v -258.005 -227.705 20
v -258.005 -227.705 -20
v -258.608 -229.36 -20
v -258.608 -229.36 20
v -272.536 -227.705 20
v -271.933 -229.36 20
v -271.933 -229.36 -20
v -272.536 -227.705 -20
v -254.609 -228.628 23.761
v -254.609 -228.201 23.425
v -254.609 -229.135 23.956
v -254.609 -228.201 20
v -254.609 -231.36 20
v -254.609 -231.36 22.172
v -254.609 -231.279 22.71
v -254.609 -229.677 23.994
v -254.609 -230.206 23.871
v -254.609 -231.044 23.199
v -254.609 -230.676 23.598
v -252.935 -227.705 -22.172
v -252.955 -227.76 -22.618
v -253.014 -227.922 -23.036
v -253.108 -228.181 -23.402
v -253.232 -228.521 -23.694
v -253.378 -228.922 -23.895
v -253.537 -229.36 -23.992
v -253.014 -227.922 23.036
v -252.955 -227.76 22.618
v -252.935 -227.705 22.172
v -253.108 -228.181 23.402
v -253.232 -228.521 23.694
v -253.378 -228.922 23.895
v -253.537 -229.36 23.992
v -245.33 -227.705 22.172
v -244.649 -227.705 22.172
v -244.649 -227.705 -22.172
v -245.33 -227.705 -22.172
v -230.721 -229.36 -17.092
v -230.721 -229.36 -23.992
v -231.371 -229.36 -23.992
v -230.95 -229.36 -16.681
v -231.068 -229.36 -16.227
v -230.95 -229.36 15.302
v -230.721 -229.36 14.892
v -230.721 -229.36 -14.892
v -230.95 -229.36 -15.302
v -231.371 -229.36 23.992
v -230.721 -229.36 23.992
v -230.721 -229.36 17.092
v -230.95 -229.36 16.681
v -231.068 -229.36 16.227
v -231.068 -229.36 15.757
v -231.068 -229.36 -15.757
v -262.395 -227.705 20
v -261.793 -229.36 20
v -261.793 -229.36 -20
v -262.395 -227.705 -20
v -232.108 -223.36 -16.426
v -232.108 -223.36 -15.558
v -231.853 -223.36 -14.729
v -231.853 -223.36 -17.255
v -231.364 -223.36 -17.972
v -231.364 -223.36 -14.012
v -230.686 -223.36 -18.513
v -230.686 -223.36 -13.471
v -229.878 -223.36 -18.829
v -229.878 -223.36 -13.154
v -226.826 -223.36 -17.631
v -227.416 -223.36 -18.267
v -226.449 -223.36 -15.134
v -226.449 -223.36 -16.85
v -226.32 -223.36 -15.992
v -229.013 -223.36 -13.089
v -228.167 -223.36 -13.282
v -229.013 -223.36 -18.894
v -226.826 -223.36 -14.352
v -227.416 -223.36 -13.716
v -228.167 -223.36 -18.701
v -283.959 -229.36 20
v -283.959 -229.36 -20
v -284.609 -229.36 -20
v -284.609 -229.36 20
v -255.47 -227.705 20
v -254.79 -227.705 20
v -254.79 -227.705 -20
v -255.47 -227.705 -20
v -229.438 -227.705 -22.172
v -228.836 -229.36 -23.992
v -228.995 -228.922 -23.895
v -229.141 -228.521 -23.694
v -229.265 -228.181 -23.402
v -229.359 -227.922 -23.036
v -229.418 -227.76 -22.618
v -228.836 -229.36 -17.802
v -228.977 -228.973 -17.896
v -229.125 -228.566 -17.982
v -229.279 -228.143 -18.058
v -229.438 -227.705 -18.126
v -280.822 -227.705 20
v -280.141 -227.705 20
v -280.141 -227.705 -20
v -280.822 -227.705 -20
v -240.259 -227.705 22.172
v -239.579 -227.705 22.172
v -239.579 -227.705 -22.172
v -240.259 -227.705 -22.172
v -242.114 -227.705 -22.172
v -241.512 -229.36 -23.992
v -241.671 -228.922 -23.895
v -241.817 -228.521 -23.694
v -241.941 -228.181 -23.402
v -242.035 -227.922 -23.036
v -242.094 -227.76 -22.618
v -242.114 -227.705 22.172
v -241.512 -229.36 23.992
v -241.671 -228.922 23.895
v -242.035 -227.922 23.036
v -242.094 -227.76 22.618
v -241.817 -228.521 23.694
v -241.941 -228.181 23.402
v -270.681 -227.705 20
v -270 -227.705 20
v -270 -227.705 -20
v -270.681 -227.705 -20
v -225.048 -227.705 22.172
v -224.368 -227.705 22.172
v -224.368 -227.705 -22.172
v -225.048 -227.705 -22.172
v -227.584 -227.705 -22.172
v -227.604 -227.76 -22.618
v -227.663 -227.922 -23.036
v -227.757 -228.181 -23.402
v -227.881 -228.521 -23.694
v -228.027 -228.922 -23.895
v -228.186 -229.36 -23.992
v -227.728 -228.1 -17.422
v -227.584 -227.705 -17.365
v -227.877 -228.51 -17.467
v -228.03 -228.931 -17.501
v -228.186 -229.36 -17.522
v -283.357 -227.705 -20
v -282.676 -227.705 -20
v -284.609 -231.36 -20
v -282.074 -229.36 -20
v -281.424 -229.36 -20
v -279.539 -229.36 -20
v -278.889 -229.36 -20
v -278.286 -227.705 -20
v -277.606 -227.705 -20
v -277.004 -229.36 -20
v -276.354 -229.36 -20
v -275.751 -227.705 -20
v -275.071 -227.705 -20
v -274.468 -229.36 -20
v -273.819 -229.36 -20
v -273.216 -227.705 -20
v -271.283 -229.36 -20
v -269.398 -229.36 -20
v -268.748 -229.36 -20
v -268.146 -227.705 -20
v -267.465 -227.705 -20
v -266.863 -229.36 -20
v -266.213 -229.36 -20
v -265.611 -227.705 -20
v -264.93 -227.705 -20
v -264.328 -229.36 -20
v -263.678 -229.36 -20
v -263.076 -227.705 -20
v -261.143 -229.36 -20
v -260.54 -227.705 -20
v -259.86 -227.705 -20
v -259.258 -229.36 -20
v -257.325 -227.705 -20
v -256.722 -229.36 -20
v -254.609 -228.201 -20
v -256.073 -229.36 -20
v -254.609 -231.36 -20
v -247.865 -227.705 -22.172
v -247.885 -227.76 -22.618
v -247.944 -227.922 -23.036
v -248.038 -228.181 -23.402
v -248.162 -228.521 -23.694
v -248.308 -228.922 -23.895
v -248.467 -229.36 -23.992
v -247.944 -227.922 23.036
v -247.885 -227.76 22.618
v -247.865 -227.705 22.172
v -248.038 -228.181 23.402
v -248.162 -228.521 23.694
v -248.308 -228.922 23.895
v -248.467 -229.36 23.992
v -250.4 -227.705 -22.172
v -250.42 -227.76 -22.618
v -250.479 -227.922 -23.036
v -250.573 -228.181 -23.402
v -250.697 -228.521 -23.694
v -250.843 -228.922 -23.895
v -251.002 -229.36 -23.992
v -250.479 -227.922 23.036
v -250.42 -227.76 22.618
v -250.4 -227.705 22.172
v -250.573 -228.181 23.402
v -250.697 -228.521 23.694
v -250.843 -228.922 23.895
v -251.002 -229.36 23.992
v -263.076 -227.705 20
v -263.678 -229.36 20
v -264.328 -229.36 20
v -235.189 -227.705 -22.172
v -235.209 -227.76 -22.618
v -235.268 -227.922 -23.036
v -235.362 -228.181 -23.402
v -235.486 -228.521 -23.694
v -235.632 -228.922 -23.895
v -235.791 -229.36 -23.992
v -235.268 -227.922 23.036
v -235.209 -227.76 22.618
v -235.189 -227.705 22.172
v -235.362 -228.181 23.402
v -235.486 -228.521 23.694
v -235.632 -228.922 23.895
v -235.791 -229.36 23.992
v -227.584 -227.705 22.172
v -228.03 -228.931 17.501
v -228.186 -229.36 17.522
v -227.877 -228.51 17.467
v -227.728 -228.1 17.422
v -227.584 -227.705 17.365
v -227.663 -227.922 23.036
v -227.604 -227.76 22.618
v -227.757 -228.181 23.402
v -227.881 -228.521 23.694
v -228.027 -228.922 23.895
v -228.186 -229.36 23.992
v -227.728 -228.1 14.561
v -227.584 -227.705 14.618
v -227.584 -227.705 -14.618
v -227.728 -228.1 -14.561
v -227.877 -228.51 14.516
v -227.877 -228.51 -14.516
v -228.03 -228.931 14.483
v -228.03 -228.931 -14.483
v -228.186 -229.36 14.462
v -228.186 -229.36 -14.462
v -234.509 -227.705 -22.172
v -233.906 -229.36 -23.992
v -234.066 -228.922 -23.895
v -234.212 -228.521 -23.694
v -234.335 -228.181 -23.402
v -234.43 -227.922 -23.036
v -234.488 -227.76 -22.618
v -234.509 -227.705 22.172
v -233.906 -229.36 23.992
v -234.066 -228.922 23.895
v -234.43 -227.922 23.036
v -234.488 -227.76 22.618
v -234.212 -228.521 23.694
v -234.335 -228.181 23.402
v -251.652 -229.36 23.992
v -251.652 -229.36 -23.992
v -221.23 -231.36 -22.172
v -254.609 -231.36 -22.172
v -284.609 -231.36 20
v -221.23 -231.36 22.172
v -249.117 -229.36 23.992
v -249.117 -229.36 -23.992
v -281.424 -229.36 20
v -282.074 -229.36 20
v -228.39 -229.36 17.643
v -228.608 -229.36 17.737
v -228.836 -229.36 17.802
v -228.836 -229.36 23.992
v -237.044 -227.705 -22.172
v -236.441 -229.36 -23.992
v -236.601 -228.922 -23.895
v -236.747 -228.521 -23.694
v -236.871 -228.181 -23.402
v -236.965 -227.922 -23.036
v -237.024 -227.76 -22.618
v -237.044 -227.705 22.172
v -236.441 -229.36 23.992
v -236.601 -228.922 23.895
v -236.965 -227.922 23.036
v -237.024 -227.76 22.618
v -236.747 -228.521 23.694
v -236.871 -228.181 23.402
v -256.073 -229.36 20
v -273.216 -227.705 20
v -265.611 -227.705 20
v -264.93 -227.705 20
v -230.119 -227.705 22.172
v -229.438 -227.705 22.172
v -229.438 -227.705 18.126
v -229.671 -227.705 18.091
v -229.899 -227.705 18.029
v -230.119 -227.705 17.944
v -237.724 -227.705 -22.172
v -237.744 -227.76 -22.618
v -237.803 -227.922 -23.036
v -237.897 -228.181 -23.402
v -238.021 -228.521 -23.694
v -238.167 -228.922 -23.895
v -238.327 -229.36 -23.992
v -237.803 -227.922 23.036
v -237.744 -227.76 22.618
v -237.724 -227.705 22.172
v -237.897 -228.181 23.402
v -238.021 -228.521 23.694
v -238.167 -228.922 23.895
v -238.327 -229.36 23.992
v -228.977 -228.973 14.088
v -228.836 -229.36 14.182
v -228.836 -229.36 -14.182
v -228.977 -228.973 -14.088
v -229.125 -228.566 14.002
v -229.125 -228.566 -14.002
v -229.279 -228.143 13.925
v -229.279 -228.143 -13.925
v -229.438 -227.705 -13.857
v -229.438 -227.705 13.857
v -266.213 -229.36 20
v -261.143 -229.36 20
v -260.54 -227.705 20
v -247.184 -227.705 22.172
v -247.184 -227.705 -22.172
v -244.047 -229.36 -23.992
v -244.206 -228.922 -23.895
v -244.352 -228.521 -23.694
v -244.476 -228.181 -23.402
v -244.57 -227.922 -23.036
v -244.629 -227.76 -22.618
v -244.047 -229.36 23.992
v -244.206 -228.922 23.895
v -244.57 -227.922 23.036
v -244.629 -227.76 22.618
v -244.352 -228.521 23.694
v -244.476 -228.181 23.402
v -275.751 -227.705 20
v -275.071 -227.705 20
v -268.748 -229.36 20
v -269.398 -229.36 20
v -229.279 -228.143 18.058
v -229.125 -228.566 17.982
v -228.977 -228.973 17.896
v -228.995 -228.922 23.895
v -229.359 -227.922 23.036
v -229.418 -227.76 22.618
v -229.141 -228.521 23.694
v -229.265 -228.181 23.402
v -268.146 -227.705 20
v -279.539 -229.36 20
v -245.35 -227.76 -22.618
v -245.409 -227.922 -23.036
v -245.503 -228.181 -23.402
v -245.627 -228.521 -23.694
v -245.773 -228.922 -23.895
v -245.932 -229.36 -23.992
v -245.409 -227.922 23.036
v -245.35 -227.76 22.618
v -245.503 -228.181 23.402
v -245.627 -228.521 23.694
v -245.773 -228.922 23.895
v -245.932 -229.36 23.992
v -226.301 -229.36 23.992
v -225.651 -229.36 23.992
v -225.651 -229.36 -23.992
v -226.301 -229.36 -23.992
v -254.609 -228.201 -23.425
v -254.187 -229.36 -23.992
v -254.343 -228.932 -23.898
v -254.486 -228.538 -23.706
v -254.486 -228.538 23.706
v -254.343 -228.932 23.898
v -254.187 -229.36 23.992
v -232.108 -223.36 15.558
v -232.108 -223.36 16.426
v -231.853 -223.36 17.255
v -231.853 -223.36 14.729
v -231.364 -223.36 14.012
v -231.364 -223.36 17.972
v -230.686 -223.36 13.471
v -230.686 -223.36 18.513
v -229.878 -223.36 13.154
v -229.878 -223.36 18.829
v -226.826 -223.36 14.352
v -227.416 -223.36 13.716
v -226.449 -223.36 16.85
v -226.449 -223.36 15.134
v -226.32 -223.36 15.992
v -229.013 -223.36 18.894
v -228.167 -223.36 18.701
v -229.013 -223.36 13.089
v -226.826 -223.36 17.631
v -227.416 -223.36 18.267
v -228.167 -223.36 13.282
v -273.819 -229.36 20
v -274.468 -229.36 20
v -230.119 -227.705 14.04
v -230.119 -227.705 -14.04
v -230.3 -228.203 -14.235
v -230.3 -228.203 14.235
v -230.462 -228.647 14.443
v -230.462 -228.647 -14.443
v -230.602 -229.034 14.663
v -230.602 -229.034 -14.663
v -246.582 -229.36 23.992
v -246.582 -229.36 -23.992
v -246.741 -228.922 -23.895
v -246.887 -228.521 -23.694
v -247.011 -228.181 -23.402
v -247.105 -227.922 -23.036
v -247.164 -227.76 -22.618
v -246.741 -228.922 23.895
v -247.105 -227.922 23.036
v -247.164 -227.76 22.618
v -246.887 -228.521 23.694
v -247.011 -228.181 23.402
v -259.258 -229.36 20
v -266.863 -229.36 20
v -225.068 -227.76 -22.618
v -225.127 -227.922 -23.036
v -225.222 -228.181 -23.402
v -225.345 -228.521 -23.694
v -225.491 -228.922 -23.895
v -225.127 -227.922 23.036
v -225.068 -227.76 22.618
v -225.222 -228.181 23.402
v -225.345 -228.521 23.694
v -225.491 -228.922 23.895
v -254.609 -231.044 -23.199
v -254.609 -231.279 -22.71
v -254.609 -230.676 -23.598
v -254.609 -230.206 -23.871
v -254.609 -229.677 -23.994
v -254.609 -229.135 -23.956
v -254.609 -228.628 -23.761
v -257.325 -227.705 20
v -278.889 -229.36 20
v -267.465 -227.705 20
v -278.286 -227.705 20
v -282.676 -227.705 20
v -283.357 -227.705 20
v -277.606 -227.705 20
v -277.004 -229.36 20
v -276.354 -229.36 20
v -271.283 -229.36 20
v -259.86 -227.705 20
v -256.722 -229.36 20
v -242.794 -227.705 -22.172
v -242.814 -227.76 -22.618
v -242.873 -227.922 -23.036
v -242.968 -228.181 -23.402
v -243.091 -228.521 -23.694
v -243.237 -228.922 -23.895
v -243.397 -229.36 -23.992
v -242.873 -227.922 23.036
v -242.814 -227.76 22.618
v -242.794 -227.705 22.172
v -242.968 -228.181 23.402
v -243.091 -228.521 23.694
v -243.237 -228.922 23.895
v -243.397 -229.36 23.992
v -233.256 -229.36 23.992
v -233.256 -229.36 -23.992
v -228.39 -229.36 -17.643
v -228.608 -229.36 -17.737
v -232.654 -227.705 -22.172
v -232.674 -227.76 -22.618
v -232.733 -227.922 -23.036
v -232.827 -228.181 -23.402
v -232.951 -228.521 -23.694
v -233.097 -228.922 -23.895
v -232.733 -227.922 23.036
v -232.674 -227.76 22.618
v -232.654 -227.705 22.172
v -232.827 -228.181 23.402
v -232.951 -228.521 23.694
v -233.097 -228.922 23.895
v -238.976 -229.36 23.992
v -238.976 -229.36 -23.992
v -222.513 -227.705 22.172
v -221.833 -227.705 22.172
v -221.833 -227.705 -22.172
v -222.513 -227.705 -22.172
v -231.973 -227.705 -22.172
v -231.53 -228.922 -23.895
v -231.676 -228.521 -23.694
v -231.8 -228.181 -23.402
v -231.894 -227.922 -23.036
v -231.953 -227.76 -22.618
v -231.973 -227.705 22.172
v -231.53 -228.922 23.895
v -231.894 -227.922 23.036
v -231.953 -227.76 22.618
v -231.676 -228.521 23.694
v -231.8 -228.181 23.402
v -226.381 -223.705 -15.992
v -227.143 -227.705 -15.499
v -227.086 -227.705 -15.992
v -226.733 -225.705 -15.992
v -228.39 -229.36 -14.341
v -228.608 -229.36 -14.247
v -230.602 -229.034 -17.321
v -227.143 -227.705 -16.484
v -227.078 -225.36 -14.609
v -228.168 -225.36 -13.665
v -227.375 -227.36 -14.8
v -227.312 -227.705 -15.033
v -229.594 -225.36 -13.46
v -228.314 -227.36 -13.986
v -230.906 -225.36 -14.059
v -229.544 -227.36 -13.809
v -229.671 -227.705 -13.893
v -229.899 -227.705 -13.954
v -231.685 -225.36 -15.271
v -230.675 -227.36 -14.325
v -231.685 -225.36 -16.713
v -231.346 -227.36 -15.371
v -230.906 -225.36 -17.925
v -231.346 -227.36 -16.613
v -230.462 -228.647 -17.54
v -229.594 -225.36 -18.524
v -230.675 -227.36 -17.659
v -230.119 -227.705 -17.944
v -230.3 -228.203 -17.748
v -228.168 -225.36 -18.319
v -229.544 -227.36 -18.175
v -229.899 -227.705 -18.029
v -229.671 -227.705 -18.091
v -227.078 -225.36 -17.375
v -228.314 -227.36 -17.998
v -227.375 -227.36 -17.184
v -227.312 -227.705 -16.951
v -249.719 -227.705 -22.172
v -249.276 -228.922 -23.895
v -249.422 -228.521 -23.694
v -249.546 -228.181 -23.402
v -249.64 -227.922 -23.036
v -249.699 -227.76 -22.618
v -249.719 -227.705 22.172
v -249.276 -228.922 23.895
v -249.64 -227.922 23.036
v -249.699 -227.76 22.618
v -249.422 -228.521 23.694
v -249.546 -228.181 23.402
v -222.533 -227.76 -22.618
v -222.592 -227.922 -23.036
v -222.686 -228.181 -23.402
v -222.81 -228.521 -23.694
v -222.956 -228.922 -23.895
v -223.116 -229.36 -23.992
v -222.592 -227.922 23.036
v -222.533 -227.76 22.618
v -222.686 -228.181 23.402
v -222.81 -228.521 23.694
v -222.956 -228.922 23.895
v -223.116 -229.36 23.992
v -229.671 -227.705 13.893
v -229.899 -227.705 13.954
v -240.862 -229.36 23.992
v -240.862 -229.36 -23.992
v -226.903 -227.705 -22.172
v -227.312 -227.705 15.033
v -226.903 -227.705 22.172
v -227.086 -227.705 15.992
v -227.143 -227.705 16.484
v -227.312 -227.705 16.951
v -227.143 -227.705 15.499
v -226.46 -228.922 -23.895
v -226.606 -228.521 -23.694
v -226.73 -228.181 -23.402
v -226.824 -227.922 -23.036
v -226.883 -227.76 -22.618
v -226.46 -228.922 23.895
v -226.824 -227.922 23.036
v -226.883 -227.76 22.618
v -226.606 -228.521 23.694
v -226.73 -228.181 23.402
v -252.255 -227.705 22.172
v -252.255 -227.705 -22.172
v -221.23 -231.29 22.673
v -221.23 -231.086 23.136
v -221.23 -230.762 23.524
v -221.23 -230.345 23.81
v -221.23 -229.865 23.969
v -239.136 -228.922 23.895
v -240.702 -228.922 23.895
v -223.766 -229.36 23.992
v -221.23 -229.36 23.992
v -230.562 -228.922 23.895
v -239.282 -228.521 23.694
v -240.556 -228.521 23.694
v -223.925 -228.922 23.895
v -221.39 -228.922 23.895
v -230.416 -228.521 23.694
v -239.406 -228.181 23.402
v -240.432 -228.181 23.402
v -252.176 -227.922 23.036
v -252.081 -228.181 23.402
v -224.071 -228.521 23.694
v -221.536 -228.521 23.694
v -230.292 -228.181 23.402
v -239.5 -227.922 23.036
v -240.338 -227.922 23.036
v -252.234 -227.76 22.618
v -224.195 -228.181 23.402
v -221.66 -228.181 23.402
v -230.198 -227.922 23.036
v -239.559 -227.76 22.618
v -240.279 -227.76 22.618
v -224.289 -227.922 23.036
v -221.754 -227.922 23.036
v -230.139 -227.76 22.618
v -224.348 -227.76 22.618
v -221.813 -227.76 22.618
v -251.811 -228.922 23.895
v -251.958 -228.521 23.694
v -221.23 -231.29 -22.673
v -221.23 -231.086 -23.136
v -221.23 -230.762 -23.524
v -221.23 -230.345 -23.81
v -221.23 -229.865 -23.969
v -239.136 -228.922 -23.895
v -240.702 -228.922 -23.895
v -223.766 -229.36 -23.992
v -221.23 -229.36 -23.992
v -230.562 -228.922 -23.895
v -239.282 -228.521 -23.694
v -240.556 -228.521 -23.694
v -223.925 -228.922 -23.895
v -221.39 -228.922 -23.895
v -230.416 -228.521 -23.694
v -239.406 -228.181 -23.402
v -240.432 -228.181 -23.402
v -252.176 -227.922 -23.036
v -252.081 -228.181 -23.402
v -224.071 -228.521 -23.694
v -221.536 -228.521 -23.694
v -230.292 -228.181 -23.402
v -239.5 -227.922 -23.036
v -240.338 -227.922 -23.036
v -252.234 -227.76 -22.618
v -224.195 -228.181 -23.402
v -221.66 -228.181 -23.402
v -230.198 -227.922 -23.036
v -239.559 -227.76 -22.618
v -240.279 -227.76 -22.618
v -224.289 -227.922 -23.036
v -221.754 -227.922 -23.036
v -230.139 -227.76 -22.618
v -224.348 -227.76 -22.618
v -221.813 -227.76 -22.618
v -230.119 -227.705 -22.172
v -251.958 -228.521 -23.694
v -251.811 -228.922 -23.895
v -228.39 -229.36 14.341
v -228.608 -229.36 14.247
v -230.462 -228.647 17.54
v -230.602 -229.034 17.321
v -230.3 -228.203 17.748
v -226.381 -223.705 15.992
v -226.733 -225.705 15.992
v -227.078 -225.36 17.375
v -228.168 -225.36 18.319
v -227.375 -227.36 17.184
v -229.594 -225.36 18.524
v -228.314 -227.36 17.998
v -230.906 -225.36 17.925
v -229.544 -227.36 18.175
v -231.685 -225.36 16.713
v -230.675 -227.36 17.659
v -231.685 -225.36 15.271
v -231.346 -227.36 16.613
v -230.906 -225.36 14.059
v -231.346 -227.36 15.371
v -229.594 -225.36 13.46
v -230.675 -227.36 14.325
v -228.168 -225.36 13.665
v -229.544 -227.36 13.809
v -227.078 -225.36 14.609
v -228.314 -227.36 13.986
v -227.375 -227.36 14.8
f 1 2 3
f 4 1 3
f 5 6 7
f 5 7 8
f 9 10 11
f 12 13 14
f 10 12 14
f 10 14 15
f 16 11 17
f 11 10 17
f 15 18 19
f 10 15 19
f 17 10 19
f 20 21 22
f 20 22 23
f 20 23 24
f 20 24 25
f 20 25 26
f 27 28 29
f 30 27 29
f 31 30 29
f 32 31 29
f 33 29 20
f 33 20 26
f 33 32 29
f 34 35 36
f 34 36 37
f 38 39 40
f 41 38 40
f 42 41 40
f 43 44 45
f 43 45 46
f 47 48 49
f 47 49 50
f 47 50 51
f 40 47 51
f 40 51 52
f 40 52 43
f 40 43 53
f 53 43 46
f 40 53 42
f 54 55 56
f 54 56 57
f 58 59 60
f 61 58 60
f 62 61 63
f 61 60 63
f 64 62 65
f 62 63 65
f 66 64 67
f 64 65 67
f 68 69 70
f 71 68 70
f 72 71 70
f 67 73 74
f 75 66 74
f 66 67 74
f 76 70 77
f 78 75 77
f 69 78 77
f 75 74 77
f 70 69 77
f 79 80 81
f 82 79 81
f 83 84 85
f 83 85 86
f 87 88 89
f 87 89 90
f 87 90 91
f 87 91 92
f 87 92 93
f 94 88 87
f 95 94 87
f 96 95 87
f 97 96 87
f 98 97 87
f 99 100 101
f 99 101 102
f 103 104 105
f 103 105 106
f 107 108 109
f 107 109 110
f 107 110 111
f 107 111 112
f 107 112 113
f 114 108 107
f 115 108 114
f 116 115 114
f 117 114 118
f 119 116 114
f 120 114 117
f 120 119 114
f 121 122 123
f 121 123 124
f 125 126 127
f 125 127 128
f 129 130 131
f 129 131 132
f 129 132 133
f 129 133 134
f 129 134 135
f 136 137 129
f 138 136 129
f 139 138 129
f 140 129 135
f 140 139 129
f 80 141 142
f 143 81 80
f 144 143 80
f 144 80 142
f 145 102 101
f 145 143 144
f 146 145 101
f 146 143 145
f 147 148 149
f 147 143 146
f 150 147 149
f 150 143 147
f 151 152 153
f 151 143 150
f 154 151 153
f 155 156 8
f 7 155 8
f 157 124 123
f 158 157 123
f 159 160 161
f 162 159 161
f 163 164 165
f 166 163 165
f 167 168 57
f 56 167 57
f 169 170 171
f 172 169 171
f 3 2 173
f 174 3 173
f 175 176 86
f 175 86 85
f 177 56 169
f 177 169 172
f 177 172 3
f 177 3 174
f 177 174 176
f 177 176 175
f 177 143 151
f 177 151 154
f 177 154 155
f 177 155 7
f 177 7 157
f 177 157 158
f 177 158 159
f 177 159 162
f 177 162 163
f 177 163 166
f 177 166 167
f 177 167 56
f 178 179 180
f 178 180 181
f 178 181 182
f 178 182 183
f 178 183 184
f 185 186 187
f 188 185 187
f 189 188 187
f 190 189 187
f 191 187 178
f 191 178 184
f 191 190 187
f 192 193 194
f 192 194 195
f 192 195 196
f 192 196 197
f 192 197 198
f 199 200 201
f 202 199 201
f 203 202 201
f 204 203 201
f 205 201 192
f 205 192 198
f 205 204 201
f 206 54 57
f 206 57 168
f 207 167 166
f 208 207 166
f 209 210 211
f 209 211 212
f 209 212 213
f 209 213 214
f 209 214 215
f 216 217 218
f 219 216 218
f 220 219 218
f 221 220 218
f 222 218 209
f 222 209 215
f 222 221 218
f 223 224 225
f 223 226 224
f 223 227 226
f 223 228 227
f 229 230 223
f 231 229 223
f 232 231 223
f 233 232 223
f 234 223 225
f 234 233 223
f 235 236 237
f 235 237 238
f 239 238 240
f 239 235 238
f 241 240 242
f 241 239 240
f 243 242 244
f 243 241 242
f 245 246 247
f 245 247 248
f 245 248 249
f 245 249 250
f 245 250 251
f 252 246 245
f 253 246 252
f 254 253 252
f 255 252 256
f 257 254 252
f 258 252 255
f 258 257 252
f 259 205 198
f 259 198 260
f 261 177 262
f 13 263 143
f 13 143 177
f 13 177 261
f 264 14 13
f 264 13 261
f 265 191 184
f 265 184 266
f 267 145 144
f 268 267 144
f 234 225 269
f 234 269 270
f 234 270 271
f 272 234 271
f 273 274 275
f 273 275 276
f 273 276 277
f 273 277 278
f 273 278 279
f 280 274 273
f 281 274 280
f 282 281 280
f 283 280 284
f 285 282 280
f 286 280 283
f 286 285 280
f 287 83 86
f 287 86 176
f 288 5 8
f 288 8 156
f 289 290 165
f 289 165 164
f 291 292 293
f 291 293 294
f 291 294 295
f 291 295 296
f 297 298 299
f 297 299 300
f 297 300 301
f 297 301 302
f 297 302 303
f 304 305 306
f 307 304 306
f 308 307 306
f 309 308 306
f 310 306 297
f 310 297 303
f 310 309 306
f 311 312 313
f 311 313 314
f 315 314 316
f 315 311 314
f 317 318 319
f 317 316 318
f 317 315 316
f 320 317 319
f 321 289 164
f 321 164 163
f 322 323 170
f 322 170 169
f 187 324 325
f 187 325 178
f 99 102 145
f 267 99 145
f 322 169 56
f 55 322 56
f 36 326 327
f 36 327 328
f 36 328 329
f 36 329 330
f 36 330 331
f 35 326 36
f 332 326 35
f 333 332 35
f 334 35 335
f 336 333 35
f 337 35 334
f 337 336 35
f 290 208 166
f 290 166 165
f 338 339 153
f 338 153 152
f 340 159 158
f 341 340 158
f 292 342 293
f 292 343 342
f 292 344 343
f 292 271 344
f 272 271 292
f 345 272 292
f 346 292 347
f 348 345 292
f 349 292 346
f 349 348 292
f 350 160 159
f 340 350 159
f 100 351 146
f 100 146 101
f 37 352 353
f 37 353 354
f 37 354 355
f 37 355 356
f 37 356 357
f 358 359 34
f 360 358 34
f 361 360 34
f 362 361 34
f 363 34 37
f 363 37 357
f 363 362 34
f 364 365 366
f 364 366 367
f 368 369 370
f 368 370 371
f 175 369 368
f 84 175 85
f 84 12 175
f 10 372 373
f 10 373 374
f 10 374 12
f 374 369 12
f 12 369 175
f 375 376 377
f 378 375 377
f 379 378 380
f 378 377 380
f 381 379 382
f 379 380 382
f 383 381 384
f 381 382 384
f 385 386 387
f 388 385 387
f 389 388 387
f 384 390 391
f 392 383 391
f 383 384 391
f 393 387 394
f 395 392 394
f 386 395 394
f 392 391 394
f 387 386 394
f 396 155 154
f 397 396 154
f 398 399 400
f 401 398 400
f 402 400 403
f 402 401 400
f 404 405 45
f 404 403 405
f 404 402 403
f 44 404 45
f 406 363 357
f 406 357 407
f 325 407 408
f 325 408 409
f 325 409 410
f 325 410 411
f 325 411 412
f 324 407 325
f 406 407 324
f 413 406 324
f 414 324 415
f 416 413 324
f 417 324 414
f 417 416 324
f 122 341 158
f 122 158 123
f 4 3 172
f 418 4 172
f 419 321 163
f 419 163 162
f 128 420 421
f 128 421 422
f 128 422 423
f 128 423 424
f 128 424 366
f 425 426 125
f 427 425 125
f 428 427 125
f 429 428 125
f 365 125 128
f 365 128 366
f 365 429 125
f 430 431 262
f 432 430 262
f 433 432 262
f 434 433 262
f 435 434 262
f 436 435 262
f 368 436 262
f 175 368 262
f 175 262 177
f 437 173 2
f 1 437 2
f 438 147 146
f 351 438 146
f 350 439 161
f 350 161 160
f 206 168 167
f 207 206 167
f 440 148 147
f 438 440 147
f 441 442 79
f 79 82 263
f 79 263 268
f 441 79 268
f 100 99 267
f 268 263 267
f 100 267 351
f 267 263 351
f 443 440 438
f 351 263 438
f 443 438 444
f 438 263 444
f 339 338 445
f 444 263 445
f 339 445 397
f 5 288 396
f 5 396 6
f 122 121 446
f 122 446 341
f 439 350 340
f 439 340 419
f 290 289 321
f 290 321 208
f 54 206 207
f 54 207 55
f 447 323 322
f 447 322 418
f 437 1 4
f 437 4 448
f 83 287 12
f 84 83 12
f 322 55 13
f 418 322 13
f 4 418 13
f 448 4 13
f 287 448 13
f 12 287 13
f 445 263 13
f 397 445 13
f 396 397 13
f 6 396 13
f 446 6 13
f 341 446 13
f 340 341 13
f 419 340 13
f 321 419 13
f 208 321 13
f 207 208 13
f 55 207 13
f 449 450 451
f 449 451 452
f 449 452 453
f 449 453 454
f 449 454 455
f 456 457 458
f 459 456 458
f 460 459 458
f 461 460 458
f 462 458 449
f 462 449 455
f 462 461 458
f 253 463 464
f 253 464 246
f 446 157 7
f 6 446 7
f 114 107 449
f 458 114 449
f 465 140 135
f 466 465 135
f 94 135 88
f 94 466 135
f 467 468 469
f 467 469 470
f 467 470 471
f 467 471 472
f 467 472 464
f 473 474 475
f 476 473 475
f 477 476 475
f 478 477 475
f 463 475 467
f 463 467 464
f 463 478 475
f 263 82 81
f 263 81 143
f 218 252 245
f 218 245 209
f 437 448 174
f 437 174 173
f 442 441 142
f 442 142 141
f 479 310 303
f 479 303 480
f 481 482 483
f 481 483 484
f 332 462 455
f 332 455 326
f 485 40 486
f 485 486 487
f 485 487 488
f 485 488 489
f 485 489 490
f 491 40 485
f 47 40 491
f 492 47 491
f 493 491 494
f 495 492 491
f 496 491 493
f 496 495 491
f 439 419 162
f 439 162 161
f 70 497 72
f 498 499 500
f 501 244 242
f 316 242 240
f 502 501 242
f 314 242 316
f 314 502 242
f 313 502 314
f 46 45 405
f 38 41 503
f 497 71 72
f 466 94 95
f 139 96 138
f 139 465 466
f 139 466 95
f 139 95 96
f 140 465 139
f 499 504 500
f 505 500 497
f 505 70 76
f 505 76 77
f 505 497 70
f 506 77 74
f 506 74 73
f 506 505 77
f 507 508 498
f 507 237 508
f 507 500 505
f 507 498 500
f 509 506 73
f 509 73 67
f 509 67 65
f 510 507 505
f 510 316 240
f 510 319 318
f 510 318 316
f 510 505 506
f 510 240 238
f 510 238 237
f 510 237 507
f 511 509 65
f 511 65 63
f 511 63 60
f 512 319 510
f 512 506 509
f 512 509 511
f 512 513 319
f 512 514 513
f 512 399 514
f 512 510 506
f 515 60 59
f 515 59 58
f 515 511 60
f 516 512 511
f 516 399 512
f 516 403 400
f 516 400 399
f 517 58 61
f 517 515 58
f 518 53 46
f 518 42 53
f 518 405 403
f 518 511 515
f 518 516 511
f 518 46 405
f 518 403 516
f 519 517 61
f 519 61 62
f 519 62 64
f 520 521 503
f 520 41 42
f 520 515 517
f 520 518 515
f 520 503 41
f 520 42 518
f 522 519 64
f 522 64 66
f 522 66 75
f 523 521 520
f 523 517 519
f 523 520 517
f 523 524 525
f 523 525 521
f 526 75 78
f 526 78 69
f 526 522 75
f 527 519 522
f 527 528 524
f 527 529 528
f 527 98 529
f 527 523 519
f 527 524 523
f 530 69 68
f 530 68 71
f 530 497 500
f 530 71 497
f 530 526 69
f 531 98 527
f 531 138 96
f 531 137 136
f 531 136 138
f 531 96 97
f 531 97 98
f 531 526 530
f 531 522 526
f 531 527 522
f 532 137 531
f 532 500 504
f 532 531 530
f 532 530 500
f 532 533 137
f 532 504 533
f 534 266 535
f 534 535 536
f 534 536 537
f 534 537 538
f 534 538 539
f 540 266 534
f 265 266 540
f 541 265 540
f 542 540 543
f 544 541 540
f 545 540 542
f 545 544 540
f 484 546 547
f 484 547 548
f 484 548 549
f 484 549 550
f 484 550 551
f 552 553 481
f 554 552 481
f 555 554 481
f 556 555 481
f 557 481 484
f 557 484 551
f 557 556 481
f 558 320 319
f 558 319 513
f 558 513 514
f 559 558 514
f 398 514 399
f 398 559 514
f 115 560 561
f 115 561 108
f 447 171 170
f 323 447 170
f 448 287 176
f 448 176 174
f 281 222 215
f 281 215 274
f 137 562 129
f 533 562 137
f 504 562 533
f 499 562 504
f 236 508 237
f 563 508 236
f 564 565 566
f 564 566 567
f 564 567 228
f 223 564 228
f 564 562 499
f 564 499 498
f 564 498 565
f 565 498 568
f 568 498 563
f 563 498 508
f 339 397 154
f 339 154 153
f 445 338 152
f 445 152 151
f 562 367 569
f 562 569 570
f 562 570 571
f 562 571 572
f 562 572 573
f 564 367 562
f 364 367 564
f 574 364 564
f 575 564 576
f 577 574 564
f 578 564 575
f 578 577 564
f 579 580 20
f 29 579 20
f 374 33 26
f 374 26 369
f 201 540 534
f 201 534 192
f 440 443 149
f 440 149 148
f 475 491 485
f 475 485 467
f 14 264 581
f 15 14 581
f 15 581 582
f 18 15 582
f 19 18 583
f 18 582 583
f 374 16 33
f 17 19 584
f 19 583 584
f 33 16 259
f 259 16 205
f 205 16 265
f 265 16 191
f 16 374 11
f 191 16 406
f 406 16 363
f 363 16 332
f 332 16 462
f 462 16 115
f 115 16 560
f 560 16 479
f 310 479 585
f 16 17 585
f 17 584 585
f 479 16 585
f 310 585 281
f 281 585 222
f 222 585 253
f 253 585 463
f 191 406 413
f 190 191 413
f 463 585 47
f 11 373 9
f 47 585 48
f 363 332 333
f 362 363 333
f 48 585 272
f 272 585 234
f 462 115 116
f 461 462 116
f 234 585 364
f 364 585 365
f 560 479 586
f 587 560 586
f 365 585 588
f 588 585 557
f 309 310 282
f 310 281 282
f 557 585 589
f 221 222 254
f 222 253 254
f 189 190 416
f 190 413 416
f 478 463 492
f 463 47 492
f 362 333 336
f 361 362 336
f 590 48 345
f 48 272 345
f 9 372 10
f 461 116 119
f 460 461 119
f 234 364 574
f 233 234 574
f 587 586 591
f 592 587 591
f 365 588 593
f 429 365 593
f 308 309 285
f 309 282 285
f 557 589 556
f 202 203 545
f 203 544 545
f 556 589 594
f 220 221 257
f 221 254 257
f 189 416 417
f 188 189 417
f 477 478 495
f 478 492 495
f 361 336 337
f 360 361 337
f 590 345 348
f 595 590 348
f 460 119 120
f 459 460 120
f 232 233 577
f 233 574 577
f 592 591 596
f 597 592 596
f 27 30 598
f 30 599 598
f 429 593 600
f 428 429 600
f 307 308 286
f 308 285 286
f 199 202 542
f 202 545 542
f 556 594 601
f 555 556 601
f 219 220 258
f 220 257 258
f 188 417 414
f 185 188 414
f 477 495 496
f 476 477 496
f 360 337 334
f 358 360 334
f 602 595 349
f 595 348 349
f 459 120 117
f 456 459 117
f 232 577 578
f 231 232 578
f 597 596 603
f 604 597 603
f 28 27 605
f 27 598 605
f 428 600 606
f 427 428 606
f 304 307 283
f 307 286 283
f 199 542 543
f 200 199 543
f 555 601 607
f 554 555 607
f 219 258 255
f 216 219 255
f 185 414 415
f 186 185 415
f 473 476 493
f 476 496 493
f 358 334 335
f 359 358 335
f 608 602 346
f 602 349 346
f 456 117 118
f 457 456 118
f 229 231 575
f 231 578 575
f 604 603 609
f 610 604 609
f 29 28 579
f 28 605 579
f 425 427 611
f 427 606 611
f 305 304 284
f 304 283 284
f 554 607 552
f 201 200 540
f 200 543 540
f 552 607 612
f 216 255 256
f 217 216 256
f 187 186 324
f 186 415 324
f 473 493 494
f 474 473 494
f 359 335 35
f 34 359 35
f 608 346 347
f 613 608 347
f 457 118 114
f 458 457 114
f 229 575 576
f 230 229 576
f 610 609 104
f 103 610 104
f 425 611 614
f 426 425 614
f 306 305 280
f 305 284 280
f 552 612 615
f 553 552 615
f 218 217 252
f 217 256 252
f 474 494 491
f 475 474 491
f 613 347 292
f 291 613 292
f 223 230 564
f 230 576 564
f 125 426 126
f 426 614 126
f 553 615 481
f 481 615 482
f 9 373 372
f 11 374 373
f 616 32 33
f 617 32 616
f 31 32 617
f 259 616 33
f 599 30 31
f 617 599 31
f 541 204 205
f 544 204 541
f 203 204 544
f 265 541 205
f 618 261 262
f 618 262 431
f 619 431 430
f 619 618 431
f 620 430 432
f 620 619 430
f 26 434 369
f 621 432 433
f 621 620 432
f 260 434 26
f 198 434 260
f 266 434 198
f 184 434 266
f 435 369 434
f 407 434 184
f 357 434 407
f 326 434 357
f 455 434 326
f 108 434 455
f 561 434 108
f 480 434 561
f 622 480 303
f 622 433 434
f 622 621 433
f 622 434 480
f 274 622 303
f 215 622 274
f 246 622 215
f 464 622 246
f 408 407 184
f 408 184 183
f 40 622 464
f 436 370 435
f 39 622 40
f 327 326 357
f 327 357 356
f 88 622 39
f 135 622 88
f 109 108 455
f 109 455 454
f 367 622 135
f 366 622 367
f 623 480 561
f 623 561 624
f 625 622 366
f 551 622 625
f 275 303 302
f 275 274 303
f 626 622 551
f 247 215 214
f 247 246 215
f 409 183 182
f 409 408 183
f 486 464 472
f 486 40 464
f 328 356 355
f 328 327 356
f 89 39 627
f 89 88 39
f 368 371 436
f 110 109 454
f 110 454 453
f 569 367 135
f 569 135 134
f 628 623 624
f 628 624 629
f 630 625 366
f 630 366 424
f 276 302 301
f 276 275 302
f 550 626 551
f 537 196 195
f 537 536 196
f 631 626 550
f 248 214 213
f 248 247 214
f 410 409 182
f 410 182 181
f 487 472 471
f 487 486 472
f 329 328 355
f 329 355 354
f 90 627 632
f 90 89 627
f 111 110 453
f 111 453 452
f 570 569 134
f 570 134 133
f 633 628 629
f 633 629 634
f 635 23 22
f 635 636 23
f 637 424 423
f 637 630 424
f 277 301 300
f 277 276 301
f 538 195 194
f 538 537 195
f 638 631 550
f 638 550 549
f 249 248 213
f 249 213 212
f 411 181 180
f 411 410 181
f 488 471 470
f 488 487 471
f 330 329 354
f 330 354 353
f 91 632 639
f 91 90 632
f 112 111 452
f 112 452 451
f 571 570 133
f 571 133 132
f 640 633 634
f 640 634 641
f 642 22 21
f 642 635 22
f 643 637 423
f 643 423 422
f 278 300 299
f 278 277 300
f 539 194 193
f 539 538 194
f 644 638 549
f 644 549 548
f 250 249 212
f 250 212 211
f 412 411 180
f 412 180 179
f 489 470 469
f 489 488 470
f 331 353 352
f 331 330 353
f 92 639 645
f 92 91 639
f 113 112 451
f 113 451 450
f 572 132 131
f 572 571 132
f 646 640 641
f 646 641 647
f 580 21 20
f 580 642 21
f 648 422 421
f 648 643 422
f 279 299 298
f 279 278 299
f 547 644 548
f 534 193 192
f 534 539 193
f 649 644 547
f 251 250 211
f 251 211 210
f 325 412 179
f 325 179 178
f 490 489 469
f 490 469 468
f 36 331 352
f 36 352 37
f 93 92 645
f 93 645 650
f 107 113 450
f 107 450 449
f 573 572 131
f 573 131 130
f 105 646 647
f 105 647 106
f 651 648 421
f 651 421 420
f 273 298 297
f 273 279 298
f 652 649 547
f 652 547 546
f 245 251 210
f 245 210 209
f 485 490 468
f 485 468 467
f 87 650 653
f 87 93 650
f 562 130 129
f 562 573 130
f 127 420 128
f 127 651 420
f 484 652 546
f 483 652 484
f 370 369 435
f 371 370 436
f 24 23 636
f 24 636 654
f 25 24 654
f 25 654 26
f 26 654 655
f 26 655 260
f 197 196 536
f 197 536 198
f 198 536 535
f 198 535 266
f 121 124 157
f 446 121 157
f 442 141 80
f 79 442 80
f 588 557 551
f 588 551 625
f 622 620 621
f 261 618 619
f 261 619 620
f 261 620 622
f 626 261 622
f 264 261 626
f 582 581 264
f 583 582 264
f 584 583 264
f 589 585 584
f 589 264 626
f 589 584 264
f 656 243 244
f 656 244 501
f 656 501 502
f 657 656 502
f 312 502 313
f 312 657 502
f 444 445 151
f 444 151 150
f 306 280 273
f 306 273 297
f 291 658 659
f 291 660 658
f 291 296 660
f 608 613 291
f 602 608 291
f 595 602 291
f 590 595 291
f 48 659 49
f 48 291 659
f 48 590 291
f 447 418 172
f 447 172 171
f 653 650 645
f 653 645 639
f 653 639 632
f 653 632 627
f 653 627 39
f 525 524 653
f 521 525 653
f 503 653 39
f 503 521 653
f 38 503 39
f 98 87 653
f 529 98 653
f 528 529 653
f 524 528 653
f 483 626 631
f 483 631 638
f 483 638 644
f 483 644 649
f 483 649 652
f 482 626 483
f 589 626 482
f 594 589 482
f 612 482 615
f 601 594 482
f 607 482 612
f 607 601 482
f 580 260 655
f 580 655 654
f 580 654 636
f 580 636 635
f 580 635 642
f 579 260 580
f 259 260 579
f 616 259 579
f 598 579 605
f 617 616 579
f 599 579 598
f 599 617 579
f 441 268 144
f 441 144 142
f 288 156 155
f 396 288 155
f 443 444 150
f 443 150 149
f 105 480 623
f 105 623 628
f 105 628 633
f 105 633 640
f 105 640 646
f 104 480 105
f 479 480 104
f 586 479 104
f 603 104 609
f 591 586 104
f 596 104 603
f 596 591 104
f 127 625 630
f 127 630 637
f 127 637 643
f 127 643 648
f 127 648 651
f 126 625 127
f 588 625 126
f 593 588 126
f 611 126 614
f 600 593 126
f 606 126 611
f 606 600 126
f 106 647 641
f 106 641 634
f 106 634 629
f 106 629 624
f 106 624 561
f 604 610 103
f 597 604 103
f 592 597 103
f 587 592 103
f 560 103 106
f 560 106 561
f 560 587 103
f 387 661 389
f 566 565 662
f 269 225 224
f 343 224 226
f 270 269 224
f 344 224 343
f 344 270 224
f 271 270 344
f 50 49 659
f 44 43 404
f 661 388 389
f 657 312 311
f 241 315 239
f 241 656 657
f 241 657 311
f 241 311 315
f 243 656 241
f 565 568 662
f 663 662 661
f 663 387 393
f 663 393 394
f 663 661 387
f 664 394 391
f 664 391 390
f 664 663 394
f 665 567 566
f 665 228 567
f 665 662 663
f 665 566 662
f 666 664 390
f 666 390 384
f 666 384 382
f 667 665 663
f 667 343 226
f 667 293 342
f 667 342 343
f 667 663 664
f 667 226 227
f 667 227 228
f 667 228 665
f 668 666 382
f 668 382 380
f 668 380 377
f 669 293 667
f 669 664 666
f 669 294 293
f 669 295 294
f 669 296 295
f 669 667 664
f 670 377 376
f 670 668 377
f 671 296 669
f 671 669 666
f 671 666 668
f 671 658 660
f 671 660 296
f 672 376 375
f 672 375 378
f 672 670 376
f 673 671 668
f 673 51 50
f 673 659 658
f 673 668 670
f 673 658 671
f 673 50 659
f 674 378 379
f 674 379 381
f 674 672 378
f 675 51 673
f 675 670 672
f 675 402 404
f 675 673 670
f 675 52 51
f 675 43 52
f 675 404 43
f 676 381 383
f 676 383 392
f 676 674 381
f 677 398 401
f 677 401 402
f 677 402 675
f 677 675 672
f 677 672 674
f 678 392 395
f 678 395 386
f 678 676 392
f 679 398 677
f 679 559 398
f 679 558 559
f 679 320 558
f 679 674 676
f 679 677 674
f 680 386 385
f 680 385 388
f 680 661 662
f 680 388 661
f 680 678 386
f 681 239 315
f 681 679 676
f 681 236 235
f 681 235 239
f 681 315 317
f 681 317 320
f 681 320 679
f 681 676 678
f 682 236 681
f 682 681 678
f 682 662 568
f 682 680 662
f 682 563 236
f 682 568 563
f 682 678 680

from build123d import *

# Parameters (mm, degrees)
BOSS_EXTRUDE1_DEPTH           = 24
SKETCH6_W                     = 30
SKETCH6_H                     = 4
CUT_EXTRUDE2_DEPTH            = 286.642446166
CUT_EXTRUDE1_DEPTH            = 242.081568844
SKETCH7_R                     = 1.5
BOSS_EXTRUDE2_DEPTH           = 8
BOSS_EXTRUDE2_DRAFT           = 10
BOSS_EXTRUDE2_PROFILE_2_DEPTH = 8
BOSS_EXTRUDE2_PROFILE_2_DRAFT = 10


with BuildPart() as part:
    # Sketch4 → Boss-Extrude1 (new, symmetric)
    with BuildSketch(Plane(origin=(-229.78233317, -228.51233317, 0), x_dir=(0, 1, 0), z_dir=(0, 0, 1))):
        Polygon((-0.84773851, -8.551941602), (0.807370009, -7.949531351), (0.807370009, -7.269034775), (-0.84773851, -6.666624604), (-0.84773851, -6.01679977), (0.807370009, -5.414389518), (0.807370009, -4.733892942), (-0.84773851, -4.131482772), (-0.84773851, -3.481657937), (0.807370009, -2.879247686), (0.807370009, -2.19875111), (-0.84773851, -1.596340939), (-0.84773851, -0.946516105), (0.807370009, -0.344105854), (0.807370009, 0.336390722), (-0.84773851, 0.938800893), (-0.84773851, 1.588625727), (0.807370009, 2.191035978), (0.807370009, 2.871532554), (-0.84773851, 3.473942725), (-0.84773851, 4.123767559), (0.807370009, 4.726177811), (0.807370009, 5.406674387), (-0.84773851, 6.009084557), (-0.84773851, 6.658909392), (0.807370009, 7.261319643), (0.807370009, 7.941816219), (-0.84773851, 8.54422639), (-0.84773851, 9.194051224), (0.807370009, 9.796461475), (0.807370009, 10.476958051), (-0.84773851, 11.079368222), (-0.84773851, 11.729193056), (0.807370009, 12.331603308), (0.807370009, 13.012099883), (-0.84773851, 13.614510054), (-0.84773851, 14.264334888), (0.807370009, 14.86674514), (0.807370009, 15.547241716), (-0.84773851, 16.149651886), (-0.84773851, 16.799476721), (0.807370009, 17.401886972), (0.807370009, 18.082383548), (-0.84773851, 18.684793719), (-0.84773851, 19.334618553), (0.807370009, 19.937028804), (0.807370009, 20.61752538), (-0.84773851, 21.219935551), (-0.84773851, 21.869760385), (0.807370009, 22.472170637), (0.807370009, 23.152667212), (-0.84773851, 23.755077383), (-0.84773851, 24.404902217), (0.807370009, 25.007312469), (0.807370009, 25.687809045), (-0.84773851, 26.290219215), (-0.84773851, 26.94004405), (0.807370009, 27.542454301), (0.807370009, 28.222950877), (-0.84773851, 28.825361048), (-0.84773851, 29.475185882), (0.807370009, 30.077596133), (0.807370009, 30.758092709), (-0.84773851, 31.36050288), (-0.84773851, 32.010327714), (0.807370009, 32.612737966), (0.807370009, 33.293234541), (-0.84773851, 33.895644712), (-0.84773851, 34.545469546), (0.807370009, 35.147879798), (0.807370009, 35.828376374), (-0.84773851, 36.430786544), (-0.84773851, 37.080611379), (0.807370009, 37.68302163), (0.807370009, 38.363518206), (-0.84773851, 38.965928377), (-0.84773851, 39.615753211), (0.807370009, 40.218163462), (0.807370009, 40.898660038), (-0.84773851, 41.501070209), (-0.84773851, 42.150895043), (0.807370009, 42.753305295), (0.807370009, 43.43380187), (-0.84773851, 44.036212041), (-0.84773851, 44.686036875), (0.807370009, 45.288447127), (0.807370009, 45.968943703), (-0.84773851, 46.571353873), (-0.84773851, 47.221178708), (0.807370009, 47.823588959), (0.807370009, 48.504085535), (-0.84773851, 49.106495706), (-0.84773851, 49.75632054), (0.807370009, 50.358730791), (0.807370009, 51.039227367), (-0.84773851, 51.641637538), (-0.84773851, 52.291462372), (0.807370009, 52.893872624), (0.807370009, 53.574369199), (-0.84773851, 54.17677937), (-0.84773851, 54.826604204), (-2.84773851, 54.826604204), (-2.84773851, -8.551941602), align=None)
    extrude(amount=BOSS_EXTRUDE1_DEPTH, both=True)

    # Sketch6 → Cut-Extrude2 (cut, through all)
    with BuildSketch(Plane.XZ.offset(231.36007168)):
        with Locations((-269.608937374, -22)):
            Rectangle(SKETCH6_W, SKETCH6_H)
        with Locations((-269.608937374, 22)):
            Rectangle(SKETCH6_W, SKETCH6_H)
    extrude(amount=-CUT_EXTRUDE2_DEPTH, mode=Mode.SUBTRACT)

    # Sketch5 → Cut-Extrude1 (cut, through all)
    with BuildSketch(Plane(origin=(-221.230391568, 0, 0), x_dir=(0, 0, -1), z_dir=(1, 0, 0))):
        with BuildLine():
            Line((-22.17244574, -227.704963161), (-22.17244574, -227.204963161))
            Line((-22.17244574, -227.204963161), (-24.67244574, -227.204963161))
            Line((-24.67244574, -227.204963161), (-24.67244574, -231.86007168))
            Line((-24.67244574, -231.86007168), (-22.17244574, -231.86007168))
            Line((-22.17244574, -231.86007168), (-22.17244574, -231.36007168))
            ThreePointArc((-22.17244574, -231.36007168), (-24, -229.53251742), (-22.17244574, -227.704963161))
        make_face()
        with BuildLine():
            Line((22.17244574, -231.86007168), (22.17244574, -231.36007168))
            ThreePointArc((22.17244574, -231.36007168), (24, -229.53251742), (22.17244574, -227.704963161))
            Line((22.17244574, -227.704963161), (22.17244574, -227.204963161))
            Line((22.17244574, -227.204963161), (24.67244574, -227.204963161))
            Line((24.67244574, -227.204963161), (24.67244574, -231.86007168))
            Line((24.67244574, -231.86007168), (22.17244574, -231.86007168))
        make_face()
    extrude(amount=-CUT_EXTRUDE1_DEPTH, mode=Mode.SUBTRACT)


with BuildPart() as boss_extrude2_tool:
    # Sketch7 → Boss-Extrude2 (with draft: the straight prism first)
    with BuildSketch(Plane.XZ.offset(231.36007168)):
        with Locations((-229.230391568, -15.991845927)):
            Circle(SKETCH7_R)
    extrude(amount=-BOSS_EXTRUDE2_DEPTH)
    # Boss-Extrude2: the draft: its side faces are tilted about the plane it starts from
    boss_extrude2_sides = [boss_extrude2_tool.faces().sort_by_distance(p)[0] for p in [
        (-230.730391568, -227.36007168, -15.991845927),
    ]]
    draft(boss_extrude2_sides, Plane.XZ.offset(231.36007168), BOSS_EXTRUDE2_DRAFT)


with BuildPart() as part_1:
    add(part.part)

    # Boss-Extrude2: add boss_extrude2_tool
    add(boss_extrude2_tool.part)


with BuildPart() as boss_extrude2_profile_2_tool:
    # Sketch7 → Boss-Extrude2 profile 2 (with draft: the straight prism first)
    with BuildSketch(Plane.XZ.offset(231.36007168)):
        with Locations((-229.230391568, 15.991845927)):
            Circle(SKETCH7_R)
    extrude(amount=-BOSS_EXTRUDE2_PROFILE_2_DEPTH)
    # Boss-Extrude2 profile 2: the draft: its side faces are tilted about the plane it starts from
    boss_extrude2_profile_2_sides = [boss_extrude2_profile_2_tool.faces().sort_by_distance(p)[0] for p in [
        (-230.730391568, -227.36007168, 15.991845927),
    ]]
    draft(boss_extrude2_profile_2_sides, Plane.XZ.offset(231.36007168), BOSS_EXTRUDE2_PROFILE_2_DRAFT)


with BuildPart() as part_2:
    add(part_1.part)

    # Boss-Extrude2 profile 2: add boss_extrude2_profile_2_tool
    add(boss_extrude2_profile_2_tool.part)


solid = part_2.part
